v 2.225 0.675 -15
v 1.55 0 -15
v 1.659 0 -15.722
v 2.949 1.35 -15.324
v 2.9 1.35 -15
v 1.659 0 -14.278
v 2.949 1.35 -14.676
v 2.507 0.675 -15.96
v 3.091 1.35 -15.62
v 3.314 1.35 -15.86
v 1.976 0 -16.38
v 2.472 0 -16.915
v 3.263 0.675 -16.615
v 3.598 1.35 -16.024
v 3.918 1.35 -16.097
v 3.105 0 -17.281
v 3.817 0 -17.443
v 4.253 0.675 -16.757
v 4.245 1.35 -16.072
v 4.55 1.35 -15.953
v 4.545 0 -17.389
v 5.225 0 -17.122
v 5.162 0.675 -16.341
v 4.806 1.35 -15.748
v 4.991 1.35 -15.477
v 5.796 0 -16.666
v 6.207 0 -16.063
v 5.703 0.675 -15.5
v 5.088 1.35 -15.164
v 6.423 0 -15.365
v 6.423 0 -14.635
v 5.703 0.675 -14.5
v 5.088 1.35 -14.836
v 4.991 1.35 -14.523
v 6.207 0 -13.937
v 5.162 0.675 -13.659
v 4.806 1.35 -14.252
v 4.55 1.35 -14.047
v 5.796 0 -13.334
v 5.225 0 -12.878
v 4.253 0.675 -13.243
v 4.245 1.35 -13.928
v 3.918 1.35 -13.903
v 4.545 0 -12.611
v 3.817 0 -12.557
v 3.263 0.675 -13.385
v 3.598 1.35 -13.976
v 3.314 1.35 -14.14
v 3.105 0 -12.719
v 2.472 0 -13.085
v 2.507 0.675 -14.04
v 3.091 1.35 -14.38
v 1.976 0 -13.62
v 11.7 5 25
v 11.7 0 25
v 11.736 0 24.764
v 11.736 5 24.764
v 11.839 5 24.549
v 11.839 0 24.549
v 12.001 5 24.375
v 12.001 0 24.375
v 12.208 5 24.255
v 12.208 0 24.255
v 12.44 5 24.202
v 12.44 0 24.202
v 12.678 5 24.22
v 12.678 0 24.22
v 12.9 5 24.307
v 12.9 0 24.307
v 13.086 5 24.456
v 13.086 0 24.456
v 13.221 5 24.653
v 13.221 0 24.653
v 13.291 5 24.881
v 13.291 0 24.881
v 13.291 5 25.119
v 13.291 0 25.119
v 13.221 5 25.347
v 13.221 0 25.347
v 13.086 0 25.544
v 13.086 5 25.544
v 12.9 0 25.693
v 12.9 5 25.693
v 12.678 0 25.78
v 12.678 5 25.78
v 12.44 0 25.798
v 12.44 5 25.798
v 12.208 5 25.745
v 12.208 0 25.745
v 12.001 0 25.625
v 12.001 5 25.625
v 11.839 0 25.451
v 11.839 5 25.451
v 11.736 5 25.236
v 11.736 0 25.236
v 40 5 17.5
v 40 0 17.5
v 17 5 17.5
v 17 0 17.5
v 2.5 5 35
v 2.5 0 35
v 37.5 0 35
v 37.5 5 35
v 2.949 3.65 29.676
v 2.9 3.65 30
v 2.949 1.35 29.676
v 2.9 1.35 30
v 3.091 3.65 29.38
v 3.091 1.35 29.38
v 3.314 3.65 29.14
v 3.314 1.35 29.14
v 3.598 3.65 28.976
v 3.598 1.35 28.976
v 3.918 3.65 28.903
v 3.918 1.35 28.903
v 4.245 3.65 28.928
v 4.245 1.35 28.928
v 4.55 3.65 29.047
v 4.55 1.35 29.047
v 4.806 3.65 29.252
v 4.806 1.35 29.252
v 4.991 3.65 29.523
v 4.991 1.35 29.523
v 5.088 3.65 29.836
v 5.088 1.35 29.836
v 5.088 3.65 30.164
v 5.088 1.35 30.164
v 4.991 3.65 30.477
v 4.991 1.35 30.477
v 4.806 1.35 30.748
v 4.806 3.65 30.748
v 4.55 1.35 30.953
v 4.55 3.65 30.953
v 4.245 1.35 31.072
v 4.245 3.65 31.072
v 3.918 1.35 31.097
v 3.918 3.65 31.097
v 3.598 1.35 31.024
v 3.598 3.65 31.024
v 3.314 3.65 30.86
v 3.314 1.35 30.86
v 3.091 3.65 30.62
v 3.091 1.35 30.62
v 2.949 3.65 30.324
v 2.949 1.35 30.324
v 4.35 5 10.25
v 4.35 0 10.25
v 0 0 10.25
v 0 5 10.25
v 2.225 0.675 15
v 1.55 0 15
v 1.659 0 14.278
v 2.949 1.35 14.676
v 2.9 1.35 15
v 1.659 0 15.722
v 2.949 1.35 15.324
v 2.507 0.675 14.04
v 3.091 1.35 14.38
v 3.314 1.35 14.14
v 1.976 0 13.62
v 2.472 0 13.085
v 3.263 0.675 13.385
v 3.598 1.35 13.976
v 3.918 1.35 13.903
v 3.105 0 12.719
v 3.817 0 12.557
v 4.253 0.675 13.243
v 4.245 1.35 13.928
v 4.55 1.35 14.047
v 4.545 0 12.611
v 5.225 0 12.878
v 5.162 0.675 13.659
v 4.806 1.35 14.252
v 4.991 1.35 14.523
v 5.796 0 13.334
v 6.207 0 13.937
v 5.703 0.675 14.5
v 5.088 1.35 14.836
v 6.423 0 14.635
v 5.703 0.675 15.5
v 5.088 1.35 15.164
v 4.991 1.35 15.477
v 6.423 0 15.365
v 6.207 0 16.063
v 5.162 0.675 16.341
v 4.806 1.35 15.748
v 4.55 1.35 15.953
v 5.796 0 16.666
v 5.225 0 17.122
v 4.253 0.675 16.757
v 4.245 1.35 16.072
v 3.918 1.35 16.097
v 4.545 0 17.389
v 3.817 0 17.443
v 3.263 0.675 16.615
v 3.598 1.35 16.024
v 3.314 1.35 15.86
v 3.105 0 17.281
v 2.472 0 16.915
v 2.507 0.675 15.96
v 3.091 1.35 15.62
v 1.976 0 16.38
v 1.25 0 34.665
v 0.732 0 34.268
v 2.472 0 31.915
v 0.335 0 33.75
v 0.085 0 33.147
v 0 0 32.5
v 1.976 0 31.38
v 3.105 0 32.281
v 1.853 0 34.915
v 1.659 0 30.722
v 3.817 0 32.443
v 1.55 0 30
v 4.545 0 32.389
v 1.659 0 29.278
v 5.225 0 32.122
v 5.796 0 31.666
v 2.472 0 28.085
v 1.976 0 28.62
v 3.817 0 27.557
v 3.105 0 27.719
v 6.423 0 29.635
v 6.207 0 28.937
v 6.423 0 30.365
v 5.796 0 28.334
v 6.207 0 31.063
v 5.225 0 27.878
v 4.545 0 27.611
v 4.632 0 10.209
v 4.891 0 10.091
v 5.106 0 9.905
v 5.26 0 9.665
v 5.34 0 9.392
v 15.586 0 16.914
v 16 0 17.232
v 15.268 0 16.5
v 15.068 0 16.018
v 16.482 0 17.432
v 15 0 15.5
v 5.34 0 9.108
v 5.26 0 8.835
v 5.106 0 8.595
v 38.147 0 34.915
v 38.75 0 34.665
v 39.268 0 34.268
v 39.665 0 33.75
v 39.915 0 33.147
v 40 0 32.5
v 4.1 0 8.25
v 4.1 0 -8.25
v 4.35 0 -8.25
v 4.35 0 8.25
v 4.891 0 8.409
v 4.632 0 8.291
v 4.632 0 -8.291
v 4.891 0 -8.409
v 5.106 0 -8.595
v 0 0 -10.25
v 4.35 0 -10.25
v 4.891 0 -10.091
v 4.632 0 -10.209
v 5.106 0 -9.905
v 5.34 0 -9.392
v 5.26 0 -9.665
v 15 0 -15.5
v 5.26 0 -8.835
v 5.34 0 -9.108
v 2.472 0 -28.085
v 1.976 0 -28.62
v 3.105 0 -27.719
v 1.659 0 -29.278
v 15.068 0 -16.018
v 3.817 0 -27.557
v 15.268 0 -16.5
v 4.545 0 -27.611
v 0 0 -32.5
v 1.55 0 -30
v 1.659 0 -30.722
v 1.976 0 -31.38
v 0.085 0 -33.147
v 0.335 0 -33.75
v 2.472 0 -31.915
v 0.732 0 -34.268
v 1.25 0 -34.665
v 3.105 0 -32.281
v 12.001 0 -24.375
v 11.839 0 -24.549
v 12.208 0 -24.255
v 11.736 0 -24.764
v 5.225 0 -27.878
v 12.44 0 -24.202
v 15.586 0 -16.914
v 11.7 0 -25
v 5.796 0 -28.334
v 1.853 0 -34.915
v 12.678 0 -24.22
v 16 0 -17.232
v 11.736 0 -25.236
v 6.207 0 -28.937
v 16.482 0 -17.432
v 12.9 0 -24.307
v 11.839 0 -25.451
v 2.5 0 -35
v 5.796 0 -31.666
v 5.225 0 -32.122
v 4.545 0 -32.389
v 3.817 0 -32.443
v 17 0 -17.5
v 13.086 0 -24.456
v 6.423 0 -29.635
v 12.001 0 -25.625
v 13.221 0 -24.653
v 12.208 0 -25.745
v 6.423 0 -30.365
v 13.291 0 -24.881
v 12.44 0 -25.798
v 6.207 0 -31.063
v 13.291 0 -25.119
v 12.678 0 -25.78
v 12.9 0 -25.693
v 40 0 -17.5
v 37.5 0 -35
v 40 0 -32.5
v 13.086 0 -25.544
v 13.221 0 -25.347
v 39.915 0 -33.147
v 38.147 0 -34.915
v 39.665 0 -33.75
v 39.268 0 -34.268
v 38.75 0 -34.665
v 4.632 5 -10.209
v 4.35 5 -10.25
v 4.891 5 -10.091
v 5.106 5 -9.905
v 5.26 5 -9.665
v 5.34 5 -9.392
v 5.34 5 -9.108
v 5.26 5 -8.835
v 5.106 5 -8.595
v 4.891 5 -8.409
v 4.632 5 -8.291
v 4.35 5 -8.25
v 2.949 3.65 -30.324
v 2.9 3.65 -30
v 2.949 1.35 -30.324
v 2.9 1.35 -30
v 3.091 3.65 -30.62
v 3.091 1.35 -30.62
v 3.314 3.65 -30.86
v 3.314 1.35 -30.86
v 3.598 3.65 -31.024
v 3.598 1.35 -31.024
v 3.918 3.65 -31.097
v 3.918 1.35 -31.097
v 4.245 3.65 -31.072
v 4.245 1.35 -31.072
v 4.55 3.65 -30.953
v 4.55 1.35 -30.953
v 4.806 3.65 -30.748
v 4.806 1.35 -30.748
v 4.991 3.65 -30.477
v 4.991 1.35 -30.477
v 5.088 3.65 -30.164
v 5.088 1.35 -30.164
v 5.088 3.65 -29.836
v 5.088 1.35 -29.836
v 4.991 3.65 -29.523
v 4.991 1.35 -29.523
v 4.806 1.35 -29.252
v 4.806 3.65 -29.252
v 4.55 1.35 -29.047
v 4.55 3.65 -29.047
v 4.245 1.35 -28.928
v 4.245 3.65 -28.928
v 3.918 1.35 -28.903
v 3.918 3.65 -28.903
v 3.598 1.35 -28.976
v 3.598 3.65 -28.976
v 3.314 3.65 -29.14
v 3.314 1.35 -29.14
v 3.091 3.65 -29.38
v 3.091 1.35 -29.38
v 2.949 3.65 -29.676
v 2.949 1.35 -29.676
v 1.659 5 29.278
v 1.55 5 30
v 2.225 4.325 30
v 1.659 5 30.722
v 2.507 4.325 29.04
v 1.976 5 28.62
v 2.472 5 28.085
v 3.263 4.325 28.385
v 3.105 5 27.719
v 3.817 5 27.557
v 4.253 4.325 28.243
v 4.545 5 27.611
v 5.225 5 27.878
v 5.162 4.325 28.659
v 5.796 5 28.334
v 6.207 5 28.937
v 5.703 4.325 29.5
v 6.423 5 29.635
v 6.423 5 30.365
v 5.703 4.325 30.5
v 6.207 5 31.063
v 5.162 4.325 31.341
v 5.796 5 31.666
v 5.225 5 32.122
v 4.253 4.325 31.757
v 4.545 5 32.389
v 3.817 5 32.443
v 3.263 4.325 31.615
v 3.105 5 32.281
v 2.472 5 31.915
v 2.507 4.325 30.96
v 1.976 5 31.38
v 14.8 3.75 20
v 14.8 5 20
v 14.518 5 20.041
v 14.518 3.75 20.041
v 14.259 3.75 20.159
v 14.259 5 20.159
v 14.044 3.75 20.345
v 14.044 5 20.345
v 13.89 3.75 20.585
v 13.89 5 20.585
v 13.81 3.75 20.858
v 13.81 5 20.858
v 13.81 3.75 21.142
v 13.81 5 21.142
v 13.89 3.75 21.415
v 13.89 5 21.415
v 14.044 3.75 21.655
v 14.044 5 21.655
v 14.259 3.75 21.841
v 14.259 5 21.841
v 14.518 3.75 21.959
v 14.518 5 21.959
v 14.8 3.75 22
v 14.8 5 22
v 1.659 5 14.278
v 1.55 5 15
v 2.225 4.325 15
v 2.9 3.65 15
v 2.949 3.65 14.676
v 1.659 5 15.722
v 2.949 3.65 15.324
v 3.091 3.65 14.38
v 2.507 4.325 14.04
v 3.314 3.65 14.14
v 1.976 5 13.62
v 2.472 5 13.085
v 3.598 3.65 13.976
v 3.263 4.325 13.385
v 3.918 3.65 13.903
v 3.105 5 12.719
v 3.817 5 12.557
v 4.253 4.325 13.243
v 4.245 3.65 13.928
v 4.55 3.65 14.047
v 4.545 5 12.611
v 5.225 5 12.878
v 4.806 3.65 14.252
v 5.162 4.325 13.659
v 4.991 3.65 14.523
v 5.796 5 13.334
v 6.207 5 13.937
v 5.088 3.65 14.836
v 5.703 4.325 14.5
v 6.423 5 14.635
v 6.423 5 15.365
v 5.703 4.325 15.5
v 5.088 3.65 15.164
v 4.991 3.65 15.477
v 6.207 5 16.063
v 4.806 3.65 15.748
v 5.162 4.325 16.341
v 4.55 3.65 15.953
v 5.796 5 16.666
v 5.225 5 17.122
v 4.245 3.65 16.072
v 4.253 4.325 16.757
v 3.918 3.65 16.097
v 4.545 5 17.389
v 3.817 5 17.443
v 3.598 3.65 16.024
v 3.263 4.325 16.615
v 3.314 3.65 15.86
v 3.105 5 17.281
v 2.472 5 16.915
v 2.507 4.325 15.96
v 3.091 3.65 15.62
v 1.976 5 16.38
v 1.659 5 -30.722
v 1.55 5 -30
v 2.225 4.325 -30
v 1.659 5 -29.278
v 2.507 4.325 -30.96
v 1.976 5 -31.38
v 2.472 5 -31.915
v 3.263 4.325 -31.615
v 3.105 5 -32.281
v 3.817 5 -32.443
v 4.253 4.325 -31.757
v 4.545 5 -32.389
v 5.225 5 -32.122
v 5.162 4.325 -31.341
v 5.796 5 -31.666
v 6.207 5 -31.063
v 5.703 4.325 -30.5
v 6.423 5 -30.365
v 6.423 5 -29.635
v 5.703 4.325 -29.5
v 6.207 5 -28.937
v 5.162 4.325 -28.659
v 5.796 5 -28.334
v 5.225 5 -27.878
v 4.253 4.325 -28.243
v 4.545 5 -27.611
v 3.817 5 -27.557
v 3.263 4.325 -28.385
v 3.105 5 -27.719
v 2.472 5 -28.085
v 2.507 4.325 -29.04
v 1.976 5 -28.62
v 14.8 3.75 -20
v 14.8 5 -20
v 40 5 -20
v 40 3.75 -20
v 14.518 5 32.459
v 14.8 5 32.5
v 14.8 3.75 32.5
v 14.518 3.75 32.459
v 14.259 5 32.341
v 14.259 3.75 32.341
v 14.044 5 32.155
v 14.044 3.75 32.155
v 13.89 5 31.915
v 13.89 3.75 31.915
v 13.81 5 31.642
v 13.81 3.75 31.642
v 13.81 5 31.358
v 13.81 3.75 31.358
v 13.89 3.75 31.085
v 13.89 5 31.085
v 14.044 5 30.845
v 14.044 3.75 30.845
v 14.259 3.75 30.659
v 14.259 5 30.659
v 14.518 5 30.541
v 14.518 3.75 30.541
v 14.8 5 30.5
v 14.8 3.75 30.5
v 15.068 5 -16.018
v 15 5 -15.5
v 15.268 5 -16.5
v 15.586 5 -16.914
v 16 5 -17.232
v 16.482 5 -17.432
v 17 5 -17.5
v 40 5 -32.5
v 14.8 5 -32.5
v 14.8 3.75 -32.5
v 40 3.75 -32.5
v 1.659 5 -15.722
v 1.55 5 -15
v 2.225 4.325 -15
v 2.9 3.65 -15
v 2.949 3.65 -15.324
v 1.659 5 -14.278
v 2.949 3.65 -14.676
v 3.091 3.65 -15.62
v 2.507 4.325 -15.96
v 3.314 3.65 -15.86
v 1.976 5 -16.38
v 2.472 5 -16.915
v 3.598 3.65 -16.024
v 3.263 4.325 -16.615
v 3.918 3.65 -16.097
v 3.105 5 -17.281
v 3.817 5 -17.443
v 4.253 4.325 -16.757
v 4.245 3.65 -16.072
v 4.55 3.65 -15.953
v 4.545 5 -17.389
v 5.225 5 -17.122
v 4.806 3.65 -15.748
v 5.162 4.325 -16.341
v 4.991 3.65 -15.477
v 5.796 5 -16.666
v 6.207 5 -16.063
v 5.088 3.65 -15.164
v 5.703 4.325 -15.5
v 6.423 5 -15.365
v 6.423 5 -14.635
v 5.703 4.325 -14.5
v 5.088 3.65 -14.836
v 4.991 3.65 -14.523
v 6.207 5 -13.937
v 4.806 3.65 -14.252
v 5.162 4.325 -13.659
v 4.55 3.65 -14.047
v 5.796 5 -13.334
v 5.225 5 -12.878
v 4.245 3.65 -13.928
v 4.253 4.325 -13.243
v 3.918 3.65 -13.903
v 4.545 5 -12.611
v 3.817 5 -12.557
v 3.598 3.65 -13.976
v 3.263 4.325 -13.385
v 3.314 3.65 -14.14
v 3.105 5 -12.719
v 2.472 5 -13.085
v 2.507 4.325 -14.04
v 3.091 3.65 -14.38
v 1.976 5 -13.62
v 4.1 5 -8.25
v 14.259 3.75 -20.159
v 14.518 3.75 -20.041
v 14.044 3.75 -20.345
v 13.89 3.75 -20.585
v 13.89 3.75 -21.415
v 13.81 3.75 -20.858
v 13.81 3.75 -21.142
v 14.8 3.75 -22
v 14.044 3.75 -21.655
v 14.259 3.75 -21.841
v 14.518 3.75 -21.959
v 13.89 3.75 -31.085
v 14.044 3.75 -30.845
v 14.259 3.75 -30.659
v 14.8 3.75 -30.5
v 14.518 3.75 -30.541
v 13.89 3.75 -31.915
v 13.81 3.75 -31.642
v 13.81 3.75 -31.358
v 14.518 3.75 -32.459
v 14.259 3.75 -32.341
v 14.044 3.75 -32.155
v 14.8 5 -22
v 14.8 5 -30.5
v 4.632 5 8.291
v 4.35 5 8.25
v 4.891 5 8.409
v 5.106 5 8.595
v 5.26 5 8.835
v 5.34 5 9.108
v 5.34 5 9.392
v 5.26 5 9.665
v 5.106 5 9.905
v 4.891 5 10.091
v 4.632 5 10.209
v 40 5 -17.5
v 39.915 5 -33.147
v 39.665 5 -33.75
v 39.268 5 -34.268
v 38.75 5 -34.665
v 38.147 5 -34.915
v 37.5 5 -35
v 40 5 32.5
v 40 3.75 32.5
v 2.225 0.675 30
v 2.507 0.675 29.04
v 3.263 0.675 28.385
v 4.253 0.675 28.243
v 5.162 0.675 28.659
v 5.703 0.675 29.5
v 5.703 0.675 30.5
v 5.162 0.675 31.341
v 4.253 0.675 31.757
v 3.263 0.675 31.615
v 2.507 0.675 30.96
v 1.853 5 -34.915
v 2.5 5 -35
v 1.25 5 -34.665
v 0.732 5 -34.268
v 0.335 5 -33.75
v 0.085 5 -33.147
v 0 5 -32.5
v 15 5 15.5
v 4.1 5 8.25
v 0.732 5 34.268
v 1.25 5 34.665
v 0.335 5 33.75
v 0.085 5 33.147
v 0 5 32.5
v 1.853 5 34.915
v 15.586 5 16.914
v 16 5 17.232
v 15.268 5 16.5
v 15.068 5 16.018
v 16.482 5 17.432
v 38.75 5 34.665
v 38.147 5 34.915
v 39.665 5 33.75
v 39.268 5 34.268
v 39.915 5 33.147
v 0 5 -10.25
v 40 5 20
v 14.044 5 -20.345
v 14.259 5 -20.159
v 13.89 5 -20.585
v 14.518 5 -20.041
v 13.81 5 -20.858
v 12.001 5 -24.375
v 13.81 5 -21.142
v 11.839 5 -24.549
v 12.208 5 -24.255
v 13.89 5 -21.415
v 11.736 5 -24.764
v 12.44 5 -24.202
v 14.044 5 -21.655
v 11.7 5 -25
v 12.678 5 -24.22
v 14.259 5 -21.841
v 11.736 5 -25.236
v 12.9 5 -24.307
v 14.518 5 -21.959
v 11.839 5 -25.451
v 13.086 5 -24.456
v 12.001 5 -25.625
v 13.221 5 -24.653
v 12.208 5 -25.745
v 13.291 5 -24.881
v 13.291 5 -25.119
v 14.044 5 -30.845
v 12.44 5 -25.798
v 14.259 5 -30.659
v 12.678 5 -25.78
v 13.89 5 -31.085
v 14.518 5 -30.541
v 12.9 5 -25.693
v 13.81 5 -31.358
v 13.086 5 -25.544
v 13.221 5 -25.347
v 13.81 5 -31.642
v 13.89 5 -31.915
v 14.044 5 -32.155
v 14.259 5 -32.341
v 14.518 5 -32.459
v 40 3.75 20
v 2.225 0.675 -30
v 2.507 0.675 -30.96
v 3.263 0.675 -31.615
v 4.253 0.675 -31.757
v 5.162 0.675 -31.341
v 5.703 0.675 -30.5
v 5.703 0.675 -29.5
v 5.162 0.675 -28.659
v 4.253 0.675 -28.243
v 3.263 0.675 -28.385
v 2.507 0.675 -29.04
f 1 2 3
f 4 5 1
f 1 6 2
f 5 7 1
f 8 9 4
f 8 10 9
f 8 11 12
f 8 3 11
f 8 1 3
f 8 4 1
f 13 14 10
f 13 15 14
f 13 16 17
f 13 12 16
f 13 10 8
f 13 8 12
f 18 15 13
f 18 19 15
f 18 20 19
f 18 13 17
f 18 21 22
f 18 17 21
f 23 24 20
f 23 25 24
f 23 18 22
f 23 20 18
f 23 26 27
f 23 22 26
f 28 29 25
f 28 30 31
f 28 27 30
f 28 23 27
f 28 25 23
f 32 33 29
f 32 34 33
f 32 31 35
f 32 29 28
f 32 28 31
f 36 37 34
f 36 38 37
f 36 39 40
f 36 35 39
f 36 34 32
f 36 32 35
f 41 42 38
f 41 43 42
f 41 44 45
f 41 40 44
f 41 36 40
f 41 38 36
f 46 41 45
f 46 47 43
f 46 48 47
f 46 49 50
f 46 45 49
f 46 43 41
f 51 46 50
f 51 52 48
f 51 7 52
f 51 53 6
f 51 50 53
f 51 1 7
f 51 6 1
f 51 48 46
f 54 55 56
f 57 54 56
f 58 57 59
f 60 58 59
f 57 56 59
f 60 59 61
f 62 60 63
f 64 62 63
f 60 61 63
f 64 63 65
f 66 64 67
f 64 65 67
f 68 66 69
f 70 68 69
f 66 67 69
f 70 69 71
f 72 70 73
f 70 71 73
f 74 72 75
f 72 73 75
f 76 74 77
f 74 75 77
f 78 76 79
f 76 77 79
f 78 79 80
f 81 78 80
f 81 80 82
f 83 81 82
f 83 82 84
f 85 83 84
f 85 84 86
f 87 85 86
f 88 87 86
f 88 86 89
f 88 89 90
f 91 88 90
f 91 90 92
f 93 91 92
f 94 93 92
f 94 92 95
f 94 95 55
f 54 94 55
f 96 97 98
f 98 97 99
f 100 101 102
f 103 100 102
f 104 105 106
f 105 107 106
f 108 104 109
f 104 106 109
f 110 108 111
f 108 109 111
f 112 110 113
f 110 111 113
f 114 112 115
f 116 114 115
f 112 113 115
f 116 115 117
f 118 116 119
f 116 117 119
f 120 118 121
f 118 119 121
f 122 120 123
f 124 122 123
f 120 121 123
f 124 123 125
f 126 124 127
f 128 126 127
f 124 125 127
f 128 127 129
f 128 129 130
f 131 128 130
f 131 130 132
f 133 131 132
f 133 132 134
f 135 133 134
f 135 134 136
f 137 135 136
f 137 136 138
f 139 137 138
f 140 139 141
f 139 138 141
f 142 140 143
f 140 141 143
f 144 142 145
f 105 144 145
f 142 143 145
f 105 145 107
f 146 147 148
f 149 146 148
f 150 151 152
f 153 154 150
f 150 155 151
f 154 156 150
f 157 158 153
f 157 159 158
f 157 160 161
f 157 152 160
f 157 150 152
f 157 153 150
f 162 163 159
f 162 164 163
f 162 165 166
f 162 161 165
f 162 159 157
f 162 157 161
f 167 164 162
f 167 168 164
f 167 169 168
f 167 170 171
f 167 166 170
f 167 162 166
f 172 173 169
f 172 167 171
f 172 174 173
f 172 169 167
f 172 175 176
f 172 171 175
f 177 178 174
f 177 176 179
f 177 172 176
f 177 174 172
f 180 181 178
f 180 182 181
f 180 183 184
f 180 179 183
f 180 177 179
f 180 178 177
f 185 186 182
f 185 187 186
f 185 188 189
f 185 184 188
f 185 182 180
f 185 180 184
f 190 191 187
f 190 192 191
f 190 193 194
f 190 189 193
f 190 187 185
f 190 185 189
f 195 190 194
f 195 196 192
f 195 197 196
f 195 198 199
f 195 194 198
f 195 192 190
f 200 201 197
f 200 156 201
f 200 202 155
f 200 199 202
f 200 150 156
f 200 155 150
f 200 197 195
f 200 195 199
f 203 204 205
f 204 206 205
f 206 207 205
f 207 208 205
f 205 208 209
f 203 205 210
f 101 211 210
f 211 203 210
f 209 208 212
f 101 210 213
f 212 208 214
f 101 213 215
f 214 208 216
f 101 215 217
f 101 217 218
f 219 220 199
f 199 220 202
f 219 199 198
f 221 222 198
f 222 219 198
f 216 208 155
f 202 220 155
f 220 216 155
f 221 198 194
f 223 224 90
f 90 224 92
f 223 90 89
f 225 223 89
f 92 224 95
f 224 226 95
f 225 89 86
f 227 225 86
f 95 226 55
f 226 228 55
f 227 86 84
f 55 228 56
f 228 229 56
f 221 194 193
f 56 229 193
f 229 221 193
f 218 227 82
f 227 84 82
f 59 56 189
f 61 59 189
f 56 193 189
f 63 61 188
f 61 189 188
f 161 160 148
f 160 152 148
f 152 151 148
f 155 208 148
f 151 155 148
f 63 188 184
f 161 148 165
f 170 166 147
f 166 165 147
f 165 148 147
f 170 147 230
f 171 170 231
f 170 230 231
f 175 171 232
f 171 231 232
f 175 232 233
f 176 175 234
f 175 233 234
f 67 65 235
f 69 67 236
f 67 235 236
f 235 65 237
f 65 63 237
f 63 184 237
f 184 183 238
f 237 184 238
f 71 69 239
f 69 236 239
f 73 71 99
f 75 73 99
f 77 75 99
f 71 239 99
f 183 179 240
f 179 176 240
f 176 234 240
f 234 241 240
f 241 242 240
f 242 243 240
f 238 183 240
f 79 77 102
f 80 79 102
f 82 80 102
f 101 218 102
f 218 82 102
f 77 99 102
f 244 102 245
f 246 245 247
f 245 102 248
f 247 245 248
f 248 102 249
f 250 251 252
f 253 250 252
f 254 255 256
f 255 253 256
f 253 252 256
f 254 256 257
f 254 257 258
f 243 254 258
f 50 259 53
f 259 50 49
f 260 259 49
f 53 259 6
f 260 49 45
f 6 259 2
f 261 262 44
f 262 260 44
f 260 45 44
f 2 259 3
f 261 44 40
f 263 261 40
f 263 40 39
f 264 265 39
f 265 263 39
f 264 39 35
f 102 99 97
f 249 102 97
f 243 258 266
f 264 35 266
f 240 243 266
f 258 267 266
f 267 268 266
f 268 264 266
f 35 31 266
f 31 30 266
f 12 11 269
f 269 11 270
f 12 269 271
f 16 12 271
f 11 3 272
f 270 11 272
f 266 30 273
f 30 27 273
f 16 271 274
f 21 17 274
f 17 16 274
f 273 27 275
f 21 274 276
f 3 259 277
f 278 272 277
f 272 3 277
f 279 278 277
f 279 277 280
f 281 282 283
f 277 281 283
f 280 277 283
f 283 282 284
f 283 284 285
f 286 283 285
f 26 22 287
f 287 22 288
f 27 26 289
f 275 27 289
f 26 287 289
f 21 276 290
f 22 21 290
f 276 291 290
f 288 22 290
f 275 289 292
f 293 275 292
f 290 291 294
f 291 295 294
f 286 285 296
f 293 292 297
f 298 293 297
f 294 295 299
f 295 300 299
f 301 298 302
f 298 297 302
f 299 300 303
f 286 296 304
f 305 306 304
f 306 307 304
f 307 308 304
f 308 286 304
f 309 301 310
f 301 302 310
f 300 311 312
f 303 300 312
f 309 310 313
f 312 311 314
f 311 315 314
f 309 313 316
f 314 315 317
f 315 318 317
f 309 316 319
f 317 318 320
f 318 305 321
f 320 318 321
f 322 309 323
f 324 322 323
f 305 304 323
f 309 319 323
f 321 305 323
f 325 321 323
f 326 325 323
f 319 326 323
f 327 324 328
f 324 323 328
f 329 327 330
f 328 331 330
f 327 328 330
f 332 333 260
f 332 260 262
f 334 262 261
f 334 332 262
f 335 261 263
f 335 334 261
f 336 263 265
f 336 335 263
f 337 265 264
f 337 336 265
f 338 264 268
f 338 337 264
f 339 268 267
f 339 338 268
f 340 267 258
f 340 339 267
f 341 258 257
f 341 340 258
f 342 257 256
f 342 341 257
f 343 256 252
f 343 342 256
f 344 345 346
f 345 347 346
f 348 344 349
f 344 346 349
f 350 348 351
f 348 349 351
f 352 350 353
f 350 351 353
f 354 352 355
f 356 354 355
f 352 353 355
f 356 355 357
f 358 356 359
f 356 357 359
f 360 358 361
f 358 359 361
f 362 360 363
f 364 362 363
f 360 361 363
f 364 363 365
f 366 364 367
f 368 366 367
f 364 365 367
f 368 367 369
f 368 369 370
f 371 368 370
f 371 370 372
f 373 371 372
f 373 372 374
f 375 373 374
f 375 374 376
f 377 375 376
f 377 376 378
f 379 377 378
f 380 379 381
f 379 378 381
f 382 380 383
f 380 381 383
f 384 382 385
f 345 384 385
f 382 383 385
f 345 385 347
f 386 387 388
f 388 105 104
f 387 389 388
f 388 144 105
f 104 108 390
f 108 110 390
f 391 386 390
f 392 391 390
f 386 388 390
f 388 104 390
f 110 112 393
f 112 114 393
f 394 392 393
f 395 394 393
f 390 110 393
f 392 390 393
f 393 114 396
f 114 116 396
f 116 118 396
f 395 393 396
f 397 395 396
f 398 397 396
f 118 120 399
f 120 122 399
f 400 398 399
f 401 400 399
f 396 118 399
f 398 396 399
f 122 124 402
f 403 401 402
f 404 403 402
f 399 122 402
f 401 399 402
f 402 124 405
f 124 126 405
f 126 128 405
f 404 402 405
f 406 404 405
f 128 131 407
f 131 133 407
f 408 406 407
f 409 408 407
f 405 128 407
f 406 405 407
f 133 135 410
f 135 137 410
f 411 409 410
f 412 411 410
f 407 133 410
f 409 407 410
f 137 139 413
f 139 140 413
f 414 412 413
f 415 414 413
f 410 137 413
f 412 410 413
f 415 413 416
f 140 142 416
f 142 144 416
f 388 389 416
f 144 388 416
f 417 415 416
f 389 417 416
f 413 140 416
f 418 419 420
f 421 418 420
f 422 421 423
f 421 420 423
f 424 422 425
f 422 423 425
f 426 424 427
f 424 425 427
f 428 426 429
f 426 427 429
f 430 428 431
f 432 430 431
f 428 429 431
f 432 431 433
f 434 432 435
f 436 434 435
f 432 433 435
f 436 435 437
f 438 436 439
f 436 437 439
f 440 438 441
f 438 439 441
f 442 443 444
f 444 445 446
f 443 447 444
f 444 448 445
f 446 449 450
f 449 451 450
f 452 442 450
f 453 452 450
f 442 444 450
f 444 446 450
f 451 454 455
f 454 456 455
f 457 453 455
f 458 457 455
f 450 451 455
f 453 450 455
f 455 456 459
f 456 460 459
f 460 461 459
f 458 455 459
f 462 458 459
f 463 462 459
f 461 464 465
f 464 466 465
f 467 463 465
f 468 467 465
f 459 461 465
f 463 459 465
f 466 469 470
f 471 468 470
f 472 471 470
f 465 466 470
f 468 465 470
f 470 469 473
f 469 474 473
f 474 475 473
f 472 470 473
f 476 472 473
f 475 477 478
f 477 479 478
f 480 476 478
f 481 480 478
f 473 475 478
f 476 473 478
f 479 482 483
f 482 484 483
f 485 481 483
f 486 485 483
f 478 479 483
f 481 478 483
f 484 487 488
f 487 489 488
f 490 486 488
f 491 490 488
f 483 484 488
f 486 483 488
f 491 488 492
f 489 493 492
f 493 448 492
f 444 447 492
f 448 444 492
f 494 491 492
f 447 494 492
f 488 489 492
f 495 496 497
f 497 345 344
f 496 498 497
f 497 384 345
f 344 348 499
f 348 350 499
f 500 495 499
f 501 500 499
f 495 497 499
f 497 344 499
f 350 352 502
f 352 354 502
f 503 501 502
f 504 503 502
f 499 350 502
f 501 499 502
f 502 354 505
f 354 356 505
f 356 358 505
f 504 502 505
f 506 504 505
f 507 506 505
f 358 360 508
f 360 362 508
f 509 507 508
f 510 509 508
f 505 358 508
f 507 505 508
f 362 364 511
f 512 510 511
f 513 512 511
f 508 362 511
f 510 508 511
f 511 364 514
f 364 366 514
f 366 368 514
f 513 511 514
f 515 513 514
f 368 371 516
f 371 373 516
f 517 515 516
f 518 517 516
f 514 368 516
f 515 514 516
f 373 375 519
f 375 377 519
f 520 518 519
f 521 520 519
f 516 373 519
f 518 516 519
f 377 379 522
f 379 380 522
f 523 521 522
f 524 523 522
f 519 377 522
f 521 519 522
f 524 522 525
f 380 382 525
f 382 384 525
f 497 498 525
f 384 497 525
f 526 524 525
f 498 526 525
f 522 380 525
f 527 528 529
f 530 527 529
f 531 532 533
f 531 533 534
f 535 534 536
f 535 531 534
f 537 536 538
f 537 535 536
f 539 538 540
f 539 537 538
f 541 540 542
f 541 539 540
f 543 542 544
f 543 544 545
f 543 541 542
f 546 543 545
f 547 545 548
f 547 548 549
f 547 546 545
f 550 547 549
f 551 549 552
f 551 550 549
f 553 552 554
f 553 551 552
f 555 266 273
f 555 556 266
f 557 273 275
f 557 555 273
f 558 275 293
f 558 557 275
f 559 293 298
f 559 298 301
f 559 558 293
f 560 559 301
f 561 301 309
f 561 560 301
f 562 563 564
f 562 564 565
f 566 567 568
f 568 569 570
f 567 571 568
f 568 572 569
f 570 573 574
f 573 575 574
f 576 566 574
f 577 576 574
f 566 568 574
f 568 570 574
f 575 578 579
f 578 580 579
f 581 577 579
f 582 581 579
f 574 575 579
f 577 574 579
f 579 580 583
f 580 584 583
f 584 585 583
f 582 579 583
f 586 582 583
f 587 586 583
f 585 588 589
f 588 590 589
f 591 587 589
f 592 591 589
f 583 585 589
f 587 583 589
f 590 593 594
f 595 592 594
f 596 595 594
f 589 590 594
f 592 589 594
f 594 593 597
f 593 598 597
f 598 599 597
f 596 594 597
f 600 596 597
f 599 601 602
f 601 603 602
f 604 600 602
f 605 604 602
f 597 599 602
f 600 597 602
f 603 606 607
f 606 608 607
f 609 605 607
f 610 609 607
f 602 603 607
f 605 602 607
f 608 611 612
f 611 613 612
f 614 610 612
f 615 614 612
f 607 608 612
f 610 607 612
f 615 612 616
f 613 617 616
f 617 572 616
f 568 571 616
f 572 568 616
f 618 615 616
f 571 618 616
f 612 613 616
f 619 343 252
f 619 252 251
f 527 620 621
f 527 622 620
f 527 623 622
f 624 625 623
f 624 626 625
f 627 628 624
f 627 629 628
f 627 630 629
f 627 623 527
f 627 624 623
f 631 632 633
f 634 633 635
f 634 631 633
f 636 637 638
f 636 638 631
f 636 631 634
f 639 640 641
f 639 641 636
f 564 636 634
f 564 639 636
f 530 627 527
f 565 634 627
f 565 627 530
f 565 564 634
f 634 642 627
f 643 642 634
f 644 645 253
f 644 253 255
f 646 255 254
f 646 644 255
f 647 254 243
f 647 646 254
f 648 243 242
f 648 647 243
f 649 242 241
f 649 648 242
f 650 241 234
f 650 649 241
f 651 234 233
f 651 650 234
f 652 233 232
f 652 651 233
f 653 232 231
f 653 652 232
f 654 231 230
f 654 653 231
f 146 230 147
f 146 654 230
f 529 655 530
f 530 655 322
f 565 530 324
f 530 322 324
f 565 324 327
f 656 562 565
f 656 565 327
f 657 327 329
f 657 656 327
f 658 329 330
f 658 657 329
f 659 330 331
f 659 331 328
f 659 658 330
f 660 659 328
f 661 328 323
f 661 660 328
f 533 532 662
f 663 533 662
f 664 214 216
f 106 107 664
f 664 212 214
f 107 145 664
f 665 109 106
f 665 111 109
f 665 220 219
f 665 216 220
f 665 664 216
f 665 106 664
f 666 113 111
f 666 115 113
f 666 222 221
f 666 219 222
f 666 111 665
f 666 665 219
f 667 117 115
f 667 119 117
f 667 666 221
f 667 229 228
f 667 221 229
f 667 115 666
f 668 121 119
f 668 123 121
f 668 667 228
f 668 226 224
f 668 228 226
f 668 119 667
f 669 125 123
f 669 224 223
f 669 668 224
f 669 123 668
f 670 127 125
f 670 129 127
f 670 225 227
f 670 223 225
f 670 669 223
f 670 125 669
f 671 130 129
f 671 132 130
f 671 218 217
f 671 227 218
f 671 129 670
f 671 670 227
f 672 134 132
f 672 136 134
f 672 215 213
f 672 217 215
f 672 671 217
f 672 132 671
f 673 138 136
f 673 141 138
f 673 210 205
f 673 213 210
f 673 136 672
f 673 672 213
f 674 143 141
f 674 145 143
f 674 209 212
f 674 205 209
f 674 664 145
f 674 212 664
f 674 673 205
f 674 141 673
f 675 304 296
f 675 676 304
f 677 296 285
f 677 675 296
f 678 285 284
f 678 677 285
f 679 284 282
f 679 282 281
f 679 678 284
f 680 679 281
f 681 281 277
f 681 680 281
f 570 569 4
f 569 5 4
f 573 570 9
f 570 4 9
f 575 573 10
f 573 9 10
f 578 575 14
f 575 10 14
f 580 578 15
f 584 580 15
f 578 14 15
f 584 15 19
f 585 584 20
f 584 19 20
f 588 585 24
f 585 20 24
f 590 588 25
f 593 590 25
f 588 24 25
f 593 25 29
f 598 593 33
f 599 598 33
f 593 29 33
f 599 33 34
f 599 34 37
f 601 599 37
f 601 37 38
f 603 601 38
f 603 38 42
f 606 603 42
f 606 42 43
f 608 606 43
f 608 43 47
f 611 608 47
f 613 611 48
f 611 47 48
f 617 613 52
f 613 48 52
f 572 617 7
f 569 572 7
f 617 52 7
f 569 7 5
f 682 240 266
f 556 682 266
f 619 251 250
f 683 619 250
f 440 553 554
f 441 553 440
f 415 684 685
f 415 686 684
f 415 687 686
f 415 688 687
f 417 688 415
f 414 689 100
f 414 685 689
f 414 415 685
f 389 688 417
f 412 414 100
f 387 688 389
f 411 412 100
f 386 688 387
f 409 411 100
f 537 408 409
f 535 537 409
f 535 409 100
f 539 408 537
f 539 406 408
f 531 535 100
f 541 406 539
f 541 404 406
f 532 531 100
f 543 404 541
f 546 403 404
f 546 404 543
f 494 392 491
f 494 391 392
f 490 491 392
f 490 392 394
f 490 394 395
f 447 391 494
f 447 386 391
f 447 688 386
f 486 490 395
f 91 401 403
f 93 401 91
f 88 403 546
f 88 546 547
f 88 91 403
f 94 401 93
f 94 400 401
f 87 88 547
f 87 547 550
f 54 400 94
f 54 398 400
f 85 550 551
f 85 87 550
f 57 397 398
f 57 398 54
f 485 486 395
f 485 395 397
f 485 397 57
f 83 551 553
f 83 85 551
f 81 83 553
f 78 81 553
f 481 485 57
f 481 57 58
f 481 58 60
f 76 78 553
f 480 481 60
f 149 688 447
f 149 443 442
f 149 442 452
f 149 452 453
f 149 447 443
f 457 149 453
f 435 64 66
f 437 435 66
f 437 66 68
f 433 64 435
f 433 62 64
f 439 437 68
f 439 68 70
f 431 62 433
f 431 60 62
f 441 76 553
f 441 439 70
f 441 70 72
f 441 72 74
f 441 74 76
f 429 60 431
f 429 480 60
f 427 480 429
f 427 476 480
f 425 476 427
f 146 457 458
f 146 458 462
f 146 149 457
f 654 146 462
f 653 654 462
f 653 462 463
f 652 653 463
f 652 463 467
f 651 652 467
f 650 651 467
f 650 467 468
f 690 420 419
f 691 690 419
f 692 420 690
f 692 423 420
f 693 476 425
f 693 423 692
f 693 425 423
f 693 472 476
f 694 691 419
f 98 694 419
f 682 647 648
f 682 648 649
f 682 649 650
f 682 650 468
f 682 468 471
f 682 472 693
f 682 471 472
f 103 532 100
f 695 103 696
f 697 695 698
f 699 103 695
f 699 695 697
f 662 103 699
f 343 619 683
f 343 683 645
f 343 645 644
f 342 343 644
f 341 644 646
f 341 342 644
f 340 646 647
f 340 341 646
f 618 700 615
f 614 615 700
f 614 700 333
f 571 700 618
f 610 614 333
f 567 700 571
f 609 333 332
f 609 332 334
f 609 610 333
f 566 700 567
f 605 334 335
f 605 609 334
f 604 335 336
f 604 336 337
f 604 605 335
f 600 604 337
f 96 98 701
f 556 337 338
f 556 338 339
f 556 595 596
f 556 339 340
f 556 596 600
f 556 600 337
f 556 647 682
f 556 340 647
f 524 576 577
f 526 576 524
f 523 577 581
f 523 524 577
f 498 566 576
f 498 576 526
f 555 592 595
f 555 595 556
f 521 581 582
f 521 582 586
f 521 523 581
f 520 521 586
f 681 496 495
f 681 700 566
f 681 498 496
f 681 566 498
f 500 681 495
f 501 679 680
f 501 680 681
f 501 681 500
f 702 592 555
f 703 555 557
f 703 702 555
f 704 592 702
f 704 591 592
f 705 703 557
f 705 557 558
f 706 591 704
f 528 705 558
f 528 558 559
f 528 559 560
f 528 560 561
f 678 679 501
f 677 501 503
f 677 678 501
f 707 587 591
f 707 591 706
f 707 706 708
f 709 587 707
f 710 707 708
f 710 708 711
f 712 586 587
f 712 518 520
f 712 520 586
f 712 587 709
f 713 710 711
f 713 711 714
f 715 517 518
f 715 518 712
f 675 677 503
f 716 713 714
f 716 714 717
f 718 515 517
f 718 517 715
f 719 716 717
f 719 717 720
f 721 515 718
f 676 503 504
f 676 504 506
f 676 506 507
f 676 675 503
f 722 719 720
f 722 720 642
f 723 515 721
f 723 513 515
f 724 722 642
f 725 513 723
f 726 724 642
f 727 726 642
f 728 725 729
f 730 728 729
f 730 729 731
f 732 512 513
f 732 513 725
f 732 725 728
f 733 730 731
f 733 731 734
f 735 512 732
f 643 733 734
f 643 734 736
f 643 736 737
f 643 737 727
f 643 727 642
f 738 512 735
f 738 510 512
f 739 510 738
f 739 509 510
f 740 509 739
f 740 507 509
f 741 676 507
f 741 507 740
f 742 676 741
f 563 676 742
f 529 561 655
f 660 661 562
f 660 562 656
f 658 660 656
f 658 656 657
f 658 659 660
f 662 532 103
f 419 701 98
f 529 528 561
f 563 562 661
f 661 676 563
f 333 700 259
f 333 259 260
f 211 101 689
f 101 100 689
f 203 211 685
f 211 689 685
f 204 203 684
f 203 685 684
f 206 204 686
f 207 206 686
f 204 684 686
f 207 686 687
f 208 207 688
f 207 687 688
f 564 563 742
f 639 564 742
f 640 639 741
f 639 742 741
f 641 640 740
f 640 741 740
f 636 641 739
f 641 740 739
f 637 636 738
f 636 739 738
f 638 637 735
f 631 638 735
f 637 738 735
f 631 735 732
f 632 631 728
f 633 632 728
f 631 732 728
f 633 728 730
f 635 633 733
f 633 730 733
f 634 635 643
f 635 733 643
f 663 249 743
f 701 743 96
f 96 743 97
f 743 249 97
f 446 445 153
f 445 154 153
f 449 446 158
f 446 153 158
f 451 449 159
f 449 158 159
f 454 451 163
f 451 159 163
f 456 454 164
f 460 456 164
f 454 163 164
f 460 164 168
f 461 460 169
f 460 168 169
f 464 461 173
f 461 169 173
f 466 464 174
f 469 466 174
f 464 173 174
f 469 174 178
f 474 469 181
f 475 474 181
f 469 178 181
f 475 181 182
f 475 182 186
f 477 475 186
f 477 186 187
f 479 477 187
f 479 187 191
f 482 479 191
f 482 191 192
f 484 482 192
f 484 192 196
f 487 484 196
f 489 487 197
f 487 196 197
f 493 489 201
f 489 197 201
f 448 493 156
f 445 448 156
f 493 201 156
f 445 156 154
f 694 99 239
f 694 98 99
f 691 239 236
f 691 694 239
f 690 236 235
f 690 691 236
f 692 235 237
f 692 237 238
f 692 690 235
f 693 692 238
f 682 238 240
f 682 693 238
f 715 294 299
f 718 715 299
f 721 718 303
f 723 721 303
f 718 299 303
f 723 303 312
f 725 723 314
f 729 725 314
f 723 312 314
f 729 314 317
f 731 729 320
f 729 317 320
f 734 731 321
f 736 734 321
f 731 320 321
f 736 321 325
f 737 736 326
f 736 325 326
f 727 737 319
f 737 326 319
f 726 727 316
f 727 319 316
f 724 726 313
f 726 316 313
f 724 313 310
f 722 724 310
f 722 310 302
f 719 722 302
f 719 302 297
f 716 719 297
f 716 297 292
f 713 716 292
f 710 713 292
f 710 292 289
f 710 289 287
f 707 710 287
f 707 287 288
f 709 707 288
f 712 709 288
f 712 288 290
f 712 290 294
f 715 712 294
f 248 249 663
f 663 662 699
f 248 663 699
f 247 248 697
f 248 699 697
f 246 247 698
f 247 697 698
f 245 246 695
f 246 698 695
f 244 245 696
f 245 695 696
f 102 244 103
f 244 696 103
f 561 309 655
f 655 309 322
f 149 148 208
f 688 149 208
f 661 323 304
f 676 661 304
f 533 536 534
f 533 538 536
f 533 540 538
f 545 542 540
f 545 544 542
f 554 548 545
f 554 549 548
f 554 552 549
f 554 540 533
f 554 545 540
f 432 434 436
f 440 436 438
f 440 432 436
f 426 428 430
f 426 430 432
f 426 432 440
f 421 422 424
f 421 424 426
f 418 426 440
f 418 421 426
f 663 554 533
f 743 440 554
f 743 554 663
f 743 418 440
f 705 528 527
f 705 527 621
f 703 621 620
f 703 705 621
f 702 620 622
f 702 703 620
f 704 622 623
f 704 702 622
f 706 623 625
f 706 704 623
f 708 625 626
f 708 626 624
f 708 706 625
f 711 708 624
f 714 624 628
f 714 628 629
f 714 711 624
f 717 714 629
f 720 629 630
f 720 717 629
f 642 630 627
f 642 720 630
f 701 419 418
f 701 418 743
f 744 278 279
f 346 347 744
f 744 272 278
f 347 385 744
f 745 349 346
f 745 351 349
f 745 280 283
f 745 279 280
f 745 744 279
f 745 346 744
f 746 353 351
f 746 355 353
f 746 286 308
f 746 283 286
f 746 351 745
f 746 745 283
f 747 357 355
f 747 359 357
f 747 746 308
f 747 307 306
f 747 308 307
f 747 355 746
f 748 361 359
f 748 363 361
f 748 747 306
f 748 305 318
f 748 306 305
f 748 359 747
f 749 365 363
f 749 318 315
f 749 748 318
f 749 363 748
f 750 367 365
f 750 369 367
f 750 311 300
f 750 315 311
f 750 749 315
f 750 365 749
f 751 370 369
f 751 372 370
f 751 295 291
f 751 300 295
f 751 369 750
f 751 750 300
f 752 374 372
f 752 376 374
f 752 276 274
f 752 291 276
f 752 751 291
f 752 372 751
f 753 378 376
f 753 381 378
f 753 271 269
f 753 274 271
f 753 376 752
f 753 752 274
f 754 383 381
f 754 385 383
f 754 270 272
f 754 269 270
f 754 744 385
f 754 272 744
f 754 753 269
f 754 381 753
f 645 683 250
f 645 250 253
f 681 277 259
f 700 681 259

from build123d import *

# Parameters (mm, degrees)
BOSS_EXTRUDE1_DEPTH                                 = 5
FILLET1_R                                           = 2
FILLET2_R                                           = 2.5
CUT_EXTRUDE2_REACH                                  = 7
CSK_FOR_M2_COUNTERSUNK_FLAT_HEAD_SCREW1_D           = 2.2
CSK_FOR_M2_COUNTERSUNK_FLAT_HEAD_SCREW1_DEPTH       = 5
CSK_FOR_M2_COUNTERSUNK_FLAT_HEAD_SCREW1_CSINK_D     = 4.9
CSK_FOR_M2_COUNTERSUNK_FLAT_HEAD_SCREW1_CSINK_ANGLE = 90
M2_TAPPED_HOLE1_D                                   = 1.6
M2_TAPPED_HOLE1_DEPTH                               = 5
SKETCH9_W                                           = 25.2
SKETCH9_H                                           = 12.5
CUT_EXTRUDE3_DEPTH                                  = 1.25
CUT_EXTRUDE4_DEPTH                                  = 1.25


with BuildPart() as part:
    # Sketch1 → Boss-Extrude1 (new body)
    with BuildSketch(Plane(origin=(0, 0, 0), x_dir=(1, 0, 0), z_dir=(0, 1, 0))):
        Polygon((0, 35), (0, 10.25), (4.1, 10.25), (4.1, -10.25), (0, -10.25), (0, -35), (40, -35), (40, -17.5), (15, -17.5), (15, 17.5), (40, 17.5), (40, 35), align=None)
    extrude(amount=BOSS_EXTRUDE1_DEPTH)

    # Fillet1
    fillet1_edges = [part.edges().sort_by_distance(p)[0] for p in [
        (15, 2.5, -17.5),
        (15, 2.5, 17.5),
    ]]
    fillet(fillet1_edges, radius=FILLET1_R)

    # Fillet2
    fillet2_edges = [part.edges().sort_by_distance(p)[0] for p in [
        (0, 2.5, -35),
        (40, 2.5, -35),
        (40, 2.5, 35),
        (0, 2.5, 35),
    ]]
    fillet(fillet2_edges, radius=FILLET2_R)

    # Sketch3 → Cut-Extrude2 (cut, up to next)
    with BuildSketch(Plane(origin=(0, 5, 0), x_dir=(1, 0, 0), z_dir=(0, 1, 0)), mode=Mode.PRIVATE) as cut_extrude2_sk1:
        with BuildLine():
            Line((4.1, 10.25), (4.35, 10.25))
            ThreePointArc((4.35, 10.25), (5.35, 9.25), (4.35, 8.25))
            Line((4.35, 8.25), (4.1, 8.25))
            Line((4.1, 8.25), (4.1, 10.25))
        make_face()
    cut_extrude2_tool1 = extrude(cut_extrude2_sk1.sketch, amount=-CUT_EXTRUDE2_REACH, mode=Mode.PRIVATE) & part.part
    add(cut_extrude2_tool1.solids().sort_by_distance((4.641756, 5, -9.25))[0], mode=Mode.SUBTRACT)
    # Sketch3 → Cut-Extrude2 (cut, up to next)
    with BuildSketch(Plane(origin=(0, 5, 0), x_dir=(1, 0, 0), z_dir=(0, 1, 0)), mode=Mode.PRIVATE) as cut_extrude2_sk2:
        with BuildLine():
            Line((4.1, -10.25), (4.1, -8.25))
            Line((4.1, -8.25), (4.35, -8.25))
            ThreePointArc((4.35, -8.25), (5.35, -9.25), (4.35, -10.25))
            Line((4.35, -10.25), (4.1, -10.25))
        make_face()
    cut_extrude2_tool2 = extrude(cut_extrude2_sk2.sketch, amount=-CUT_EXTRUDE2_REACH, mode=Mode.PRIVATE) & part.part
    add(cut_extrude2_tool2.solids().sort_by_distance((4.641756, 5, 9.25))[0], mode=Mode.SUBTRACT)

    # CSK for M2 Countersunk Flat Head Screw1
    with Locations(Plane(origin=(0, 5, 0), x_dir=(1, 0, 0), z_dir=(0, 1, 0))):
        with Locations((4, 30), (4, 15), (4, -15), (4, -30)):
            csk_for_m2_countersunk_flat_head_screw1 = CounterSinkHole(CSK_FOR_M2_COUNTERSUNK_FLAT_HEAD_SCREW1_D / 2, CSK_FOR_M2_COUNTERSUNK_FLAT_HEAD_SCREW1_CSINK_D / 2, depth=CSK_FOR_M2_COUNTERSUNK_FLAT_HEAD_SCREW1_DEPTH, counter_sink_angle=CSK_FOR_M2_COUNTERSUNK_FLAT_HEAD_SCREW1_CSINK_ANGLE)

    # M2 Tapped Hole1
    with Locations(Plane(origin=(0, 5, 0), x_dir=(1, 0, 0), z_dir=(0, 1, 0))):
        with Locations((12.5, -25), (12.5, 25)):
            Hole(M2_TAPPED_HOLE1_D / 2, depth=M2_TAPPED_HOLE1_DEPTH)

    # Sketch9 → Cut-Extrude3 (cut)
    with BuildSketch(Plane(origin=(0, 5, 0), x_dir=(1, 0, 0), z_dir=(0, 1, 0))):
        with Locations((27.4, 26.25)):
            Rectangle(SKETCH9_W, SKETCH9_H)
        with Locations((27.4, -26.25)):
            Rectangle(SKETCH9_W, SKETCH9_H)
    extrude(amount=-CUT_EXTRUDE3_DEPTH, mode=Mode.SUBTRACT)

    # Sketch10 → Cut-Extrude4 (cut)
    with BuildSketch(Plane(origin=(0, 5, 0), x_dir=(1, 0, 0), z_dir=(0, 1, 0))):
        with BuildLine():
            Line((14.8, 22), (14.8, 20))
            ThreePointArc((14.8, 20), (13.8, 21), (14.8, 22))
        make_face()
        with BuildLine():
            Line((14.8, 30.5), (14.8, 32.5))
            ThreePointArc((14.8, 32.5), (13.8, 31.5), (14.8, 30.5))
        make_face()
    cut_extrude4 = extrude(amount=-CUT_EXTRUDE4_DEPTH, mode=Mode.SUBTRACT)

    # Mirror1: CSK for M2 Countersunk Flat Head Screw1 across plane
    add(csk_for_m2_countersunk_flat_head_screw1.mirror(Plane(origin=(0, 2.5, 0), x_dir=(0, 0, 1), z_dir=(0, -1, 0))), mode=Mode.SUBTRACT)

    # Mirror2: Cut-Extrude4 across plane
    add(cut_extrude4.mirror(Plane.XY), mode=Mode.SUBTRACT)


solid = part.part
